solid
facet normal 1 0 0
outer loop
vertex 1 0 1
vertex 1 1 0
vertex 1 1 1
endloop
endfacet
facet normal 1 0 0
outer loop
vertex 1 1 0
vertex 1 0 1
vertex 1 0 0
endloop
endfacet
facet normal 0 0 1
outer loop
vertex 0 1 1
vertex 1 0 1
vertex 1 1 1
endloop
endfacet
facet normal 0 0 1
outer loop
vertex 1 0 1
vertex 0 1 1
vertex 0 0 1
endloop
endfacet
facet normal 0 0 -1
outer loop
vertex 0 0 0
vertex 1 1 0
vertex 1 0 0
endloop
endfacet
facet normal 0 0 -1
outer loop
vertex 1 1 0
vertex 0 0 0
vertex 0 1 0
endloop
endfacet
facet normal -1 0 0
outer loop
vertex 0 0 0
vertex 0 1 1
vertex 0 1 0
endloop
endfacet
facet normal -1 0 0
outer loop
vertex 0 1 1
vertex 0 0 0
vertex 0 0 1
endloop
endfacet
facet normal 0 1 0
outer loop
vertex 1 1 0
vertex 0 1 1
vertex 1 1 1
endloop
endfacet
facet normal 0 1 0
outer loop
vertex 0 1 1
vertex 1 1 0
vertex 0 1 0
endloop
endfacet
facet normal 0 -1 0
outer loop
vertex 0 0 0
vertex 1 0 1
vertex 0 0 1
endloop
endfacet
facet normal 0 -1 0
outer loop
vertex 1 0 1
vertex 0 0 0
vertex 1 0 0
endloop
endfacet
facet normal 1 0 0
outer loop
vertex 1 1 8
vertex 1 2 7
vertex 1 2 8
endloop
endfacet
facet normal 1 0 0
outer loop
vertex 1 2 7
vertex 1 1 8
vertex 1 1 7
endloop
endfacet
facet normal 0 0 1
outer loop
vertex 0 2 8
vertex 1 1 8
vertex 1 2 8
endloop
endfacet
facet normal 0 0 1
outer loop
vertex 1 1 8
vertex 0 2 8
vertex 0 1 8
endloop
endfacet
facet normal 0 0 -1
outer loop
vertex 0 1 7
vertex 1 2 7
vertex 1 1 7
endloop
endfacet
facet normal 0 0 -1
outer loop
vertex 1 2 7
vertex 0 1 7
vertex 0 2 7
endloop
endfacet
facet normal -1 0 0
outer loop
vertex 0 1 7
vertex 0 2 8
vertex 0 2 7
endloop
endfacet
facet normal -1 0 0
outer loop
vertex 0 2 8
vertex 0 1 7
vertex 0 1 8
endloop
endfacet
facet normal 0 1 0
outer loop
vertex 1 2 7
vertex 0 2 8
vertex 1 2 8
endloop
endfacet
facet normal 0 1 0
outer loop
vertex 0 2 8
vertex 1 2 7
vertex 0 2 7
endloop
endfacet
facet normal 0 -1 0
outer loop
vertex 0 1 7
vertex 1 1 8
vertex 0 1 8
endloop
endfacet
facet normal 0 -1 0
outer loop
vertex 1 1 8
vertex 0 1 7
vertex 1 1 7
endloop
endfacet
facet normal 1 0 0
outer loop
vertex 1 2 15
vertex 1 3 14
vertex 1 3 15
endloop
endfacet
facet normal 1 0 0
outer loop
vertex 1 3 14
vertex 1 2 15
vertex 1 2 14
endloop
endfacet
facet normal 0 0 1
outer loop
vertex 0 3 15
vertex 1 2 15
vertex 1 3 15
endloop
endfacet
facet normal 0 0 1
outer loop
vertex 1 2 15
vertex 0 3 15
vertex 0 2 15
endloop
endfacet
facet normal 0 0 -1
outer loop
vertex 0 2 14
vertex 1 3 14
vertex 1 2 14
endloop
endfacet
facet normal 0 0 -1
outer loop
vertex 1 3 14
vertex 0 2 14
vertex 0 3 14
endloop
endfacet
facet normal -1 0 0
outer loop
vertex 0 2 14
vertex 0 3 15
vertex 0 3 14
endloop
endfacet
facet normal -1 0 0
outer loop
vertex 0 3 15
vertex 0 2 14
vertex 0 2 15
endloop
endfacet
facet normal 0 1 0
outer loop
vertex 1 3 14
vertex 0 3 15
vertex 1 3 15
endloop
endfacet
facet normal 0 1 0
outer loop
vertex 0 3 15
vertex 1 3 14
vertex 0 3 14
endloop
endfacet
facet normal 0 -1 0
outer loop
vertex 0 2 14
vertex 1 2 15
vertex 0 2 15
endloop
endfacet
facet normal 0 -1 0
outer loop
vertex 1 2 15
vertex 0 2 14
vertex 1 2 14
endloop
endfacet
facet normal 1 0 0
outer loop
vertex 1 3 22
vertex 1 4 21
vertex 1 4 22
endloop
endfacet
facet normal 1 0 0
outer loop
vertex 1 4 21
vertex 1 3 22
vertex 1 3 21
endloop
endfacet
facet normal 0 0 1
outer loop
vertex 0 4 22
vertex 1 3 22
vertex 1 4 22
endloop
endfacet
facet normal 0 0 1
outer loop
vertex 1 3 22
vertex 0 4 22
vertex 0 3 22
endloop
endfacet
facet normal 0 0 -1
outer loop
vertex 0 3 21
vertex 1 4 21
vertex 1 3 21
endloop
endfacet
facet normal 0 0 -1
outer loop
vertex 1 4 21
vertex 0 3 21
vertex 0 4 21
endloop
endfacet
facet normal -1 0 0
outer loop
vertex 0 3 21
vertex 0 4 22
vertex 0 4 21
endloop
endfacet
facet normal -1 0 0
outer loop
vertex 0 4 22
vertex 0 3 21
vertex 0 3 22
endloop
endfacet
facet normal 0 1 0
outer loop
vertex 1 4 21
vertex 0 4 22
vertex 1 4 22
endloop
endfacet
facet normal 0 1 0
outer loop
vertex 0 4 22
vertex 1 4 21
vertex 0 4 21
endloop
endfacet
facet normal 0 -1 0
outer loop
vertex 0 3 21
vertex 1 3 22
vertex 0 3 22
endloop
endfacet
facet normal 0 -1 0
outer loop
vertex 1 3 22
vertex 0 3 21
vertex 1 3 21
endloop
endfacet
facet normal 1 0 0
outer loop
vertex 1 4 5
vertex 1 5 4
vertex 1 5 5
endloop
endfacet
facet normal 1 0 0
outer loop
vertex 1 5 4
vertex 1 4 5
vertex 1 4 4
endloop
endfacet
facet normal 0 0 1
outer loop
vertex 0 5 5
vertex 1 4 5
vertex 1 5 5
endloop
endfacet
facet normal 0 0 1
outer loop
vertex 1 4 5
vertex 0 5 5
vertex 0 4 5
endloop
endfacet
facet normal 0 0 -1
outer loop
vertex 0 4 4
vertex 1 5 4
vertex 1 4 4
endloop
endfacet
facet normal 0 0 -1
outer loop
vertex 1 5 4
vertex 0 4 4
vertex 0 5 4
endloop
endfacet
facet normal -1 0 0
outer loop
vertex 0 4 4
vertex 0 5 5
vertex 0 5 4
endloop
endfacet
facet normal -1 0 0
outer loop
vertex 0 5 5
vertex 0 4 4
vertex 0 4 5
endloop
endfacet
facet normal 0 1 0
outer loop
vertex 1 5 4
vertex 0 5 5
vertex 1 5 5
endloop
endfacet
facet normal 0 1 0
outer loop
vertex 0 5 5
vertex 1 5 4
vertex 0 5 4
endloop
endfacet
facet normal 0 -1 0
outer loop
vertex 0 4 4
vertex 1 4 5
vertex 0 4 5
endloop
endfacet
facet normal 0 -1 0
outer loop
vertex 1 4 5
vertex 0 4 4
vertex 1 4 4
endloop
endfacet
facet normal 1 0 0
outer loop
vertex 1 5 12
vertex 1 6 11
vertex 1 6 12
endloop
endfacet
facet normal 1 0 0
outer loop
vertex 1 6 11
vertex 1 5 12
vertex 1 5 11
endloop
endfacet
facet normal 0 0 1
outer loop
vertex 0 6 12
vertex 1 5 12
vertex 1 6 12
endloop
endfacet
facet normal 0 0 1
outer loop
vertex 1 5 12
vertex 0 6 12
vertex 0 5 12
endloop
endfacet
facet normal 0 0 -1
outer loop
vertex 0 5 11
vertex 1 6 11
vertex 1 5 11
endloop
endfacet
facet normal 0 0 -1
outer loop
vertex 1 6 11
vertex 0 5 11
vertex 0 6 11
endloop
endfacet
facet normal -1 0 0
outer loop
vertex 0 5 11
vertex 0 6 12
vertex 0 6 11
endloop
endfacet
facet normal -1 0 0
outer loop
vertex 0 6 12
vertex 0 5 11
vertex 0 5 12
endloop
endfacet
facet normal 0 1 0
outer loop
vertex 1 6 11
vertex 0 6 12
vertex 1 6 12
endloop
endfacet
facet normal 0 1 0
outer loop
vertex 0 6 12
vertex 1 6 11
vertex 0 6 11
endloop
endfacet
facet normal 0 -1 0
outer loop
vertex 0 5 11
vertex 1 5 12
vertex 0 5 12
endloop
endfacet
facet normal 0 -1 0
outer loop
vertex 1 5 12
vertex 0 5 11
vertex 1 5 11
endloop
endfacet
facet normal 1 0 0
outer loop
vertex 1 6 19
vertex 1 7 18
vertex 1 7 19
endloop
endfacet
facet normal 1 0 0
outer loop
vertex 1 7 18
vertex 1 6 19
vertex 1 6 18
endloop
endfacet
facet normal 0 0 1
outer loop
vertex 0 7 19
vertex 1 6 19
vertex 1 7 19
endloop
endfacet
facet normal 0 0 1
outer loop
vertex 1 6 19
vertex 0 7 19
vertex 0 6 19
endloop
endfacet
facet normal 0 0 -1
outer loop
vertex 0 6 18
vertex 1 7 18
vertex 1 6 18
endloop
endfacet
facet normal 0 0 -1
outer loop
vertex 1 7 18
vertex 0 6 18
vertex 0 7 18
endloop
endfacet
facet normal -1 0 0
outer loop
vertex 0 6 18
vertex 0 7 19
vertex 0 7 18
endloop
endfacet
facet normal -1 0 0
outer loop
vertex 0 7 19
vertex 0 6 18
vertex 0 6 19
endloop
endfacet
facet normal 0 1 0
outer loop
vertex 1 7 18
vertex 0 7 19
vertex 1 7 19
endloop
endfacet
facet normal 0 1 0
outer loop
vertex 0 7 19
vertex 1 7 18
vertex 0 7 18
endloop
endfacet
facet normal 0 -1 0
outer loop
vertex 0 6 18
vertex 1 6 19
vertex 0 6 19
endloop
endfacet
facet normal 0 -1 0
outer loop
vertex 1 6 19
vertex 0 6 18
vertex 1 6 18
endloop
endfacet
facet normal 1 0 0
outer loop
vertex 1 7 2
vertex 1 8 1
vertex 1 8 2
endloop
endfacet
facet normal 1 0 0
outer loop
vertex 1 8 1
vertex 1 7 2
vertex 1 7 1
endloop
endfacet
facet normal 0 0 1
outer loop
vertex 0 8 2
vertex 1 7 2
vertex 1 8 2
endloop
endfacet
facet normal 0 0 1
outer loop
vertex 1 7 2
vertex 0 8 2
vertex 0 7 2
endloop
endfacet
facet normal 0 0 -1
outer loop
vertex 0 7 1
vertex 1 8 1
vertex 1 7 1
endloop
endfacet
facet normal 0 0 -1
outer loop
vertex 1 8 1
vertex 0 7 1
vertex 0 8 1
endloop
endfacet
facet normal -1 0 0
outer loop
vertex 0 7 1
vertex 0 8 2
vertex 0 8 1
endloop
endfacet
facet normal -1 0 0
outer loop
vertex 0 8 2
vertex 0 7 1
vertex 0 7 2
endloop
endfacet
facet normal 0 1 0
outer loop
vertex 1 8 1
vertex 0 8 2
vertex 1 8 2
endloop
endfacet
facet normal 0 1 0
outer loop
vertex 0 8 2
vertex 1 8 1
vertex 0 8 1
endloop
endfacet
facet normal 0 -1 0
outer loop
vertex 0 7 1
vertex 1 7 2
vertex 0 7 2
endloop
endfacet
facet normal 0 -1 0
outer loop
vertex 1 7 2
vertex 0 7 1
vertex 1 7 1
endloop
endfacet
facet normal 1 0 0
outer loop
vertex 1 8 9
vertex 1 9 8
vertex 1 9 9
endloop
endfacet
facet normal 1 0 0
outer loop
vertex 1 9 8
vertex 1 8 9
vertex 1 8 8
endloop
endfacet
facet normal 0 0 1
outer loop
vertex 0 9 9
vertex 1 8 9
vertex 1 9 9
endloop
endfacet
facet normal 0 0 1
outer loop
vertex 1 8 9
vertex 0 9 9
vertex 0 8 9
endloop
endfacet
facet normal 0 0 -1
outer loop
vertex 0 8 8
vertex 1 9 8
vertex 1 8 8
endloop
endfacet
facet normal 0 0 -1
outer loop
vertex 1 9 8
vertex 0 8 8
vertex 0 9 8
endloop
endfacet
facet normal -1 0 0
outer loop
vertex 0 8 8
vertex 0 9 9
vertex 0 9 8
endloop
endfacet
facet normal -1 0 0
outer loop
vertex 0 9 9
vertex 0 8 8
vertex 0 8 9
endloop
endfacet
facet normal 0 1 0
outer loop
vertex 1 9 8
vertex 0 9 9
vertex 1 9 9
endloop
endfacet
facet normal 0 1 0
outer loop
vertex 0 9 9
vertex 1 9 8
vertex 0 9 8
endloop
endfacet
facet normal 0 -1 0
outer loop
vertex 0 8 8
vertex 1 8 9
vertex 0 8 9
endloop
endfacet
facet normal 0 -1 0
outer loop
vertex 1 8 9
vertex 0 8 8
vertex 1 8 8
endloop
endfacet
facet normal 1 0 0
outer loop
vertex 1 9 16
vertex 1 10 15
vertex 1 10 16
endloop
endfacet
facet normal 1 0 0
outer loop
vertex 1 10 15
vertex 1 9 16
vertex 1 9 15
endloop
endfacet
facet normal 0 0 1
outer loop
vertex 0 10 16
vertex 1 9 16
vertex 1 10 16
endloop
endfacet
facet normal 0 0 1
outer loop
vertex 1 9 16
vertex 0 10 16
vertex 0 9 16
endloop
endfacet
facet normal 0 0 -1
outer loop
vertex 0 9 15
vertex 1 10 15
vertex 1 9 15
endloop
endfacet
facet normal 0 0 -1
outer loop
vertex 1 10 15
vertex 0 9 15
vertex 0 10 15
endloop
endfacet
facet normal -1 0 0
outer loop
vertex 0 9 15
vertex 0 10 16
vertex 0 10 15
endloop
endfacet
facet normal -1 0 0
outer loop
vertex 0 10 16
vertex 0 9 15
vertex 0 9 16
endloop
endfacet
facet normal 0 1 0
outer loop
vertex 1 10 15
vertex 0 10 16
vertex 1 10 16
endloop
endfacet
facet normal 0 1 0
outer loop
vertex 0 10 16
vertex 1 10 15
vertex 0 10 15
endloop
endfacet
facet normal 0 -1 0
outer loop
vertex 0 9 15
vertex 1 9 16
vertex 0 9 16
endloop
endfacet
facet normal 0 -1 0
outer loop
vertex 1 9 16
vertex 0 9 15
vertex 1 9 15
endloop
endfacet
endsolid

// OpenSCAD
union() {
    translate([0, 0, 0]) cube([1, 1, 1]);
    translate([0, 1, 7]) cube([1, 1, 1]);
    translate([0, 2, 14]) cube([1, 1, 1]);
    translate([0, 3, 21]) cube([1, 1, 1]);
    translate([0, 4, 4]) cube([1, 1, 1]);
    translate([0, 5, 11]) cube([1, 1, 1]);
    translate([0, 6, 18]) cube([1, 1, 1]);
    translate([0, 7, 1]) cube([1, 1, 1]);
    translate([0, 8, 8]) cube([1, 1, 1]);
    translate([0, 9, 15]) cube([1, 1, 1]);
}
